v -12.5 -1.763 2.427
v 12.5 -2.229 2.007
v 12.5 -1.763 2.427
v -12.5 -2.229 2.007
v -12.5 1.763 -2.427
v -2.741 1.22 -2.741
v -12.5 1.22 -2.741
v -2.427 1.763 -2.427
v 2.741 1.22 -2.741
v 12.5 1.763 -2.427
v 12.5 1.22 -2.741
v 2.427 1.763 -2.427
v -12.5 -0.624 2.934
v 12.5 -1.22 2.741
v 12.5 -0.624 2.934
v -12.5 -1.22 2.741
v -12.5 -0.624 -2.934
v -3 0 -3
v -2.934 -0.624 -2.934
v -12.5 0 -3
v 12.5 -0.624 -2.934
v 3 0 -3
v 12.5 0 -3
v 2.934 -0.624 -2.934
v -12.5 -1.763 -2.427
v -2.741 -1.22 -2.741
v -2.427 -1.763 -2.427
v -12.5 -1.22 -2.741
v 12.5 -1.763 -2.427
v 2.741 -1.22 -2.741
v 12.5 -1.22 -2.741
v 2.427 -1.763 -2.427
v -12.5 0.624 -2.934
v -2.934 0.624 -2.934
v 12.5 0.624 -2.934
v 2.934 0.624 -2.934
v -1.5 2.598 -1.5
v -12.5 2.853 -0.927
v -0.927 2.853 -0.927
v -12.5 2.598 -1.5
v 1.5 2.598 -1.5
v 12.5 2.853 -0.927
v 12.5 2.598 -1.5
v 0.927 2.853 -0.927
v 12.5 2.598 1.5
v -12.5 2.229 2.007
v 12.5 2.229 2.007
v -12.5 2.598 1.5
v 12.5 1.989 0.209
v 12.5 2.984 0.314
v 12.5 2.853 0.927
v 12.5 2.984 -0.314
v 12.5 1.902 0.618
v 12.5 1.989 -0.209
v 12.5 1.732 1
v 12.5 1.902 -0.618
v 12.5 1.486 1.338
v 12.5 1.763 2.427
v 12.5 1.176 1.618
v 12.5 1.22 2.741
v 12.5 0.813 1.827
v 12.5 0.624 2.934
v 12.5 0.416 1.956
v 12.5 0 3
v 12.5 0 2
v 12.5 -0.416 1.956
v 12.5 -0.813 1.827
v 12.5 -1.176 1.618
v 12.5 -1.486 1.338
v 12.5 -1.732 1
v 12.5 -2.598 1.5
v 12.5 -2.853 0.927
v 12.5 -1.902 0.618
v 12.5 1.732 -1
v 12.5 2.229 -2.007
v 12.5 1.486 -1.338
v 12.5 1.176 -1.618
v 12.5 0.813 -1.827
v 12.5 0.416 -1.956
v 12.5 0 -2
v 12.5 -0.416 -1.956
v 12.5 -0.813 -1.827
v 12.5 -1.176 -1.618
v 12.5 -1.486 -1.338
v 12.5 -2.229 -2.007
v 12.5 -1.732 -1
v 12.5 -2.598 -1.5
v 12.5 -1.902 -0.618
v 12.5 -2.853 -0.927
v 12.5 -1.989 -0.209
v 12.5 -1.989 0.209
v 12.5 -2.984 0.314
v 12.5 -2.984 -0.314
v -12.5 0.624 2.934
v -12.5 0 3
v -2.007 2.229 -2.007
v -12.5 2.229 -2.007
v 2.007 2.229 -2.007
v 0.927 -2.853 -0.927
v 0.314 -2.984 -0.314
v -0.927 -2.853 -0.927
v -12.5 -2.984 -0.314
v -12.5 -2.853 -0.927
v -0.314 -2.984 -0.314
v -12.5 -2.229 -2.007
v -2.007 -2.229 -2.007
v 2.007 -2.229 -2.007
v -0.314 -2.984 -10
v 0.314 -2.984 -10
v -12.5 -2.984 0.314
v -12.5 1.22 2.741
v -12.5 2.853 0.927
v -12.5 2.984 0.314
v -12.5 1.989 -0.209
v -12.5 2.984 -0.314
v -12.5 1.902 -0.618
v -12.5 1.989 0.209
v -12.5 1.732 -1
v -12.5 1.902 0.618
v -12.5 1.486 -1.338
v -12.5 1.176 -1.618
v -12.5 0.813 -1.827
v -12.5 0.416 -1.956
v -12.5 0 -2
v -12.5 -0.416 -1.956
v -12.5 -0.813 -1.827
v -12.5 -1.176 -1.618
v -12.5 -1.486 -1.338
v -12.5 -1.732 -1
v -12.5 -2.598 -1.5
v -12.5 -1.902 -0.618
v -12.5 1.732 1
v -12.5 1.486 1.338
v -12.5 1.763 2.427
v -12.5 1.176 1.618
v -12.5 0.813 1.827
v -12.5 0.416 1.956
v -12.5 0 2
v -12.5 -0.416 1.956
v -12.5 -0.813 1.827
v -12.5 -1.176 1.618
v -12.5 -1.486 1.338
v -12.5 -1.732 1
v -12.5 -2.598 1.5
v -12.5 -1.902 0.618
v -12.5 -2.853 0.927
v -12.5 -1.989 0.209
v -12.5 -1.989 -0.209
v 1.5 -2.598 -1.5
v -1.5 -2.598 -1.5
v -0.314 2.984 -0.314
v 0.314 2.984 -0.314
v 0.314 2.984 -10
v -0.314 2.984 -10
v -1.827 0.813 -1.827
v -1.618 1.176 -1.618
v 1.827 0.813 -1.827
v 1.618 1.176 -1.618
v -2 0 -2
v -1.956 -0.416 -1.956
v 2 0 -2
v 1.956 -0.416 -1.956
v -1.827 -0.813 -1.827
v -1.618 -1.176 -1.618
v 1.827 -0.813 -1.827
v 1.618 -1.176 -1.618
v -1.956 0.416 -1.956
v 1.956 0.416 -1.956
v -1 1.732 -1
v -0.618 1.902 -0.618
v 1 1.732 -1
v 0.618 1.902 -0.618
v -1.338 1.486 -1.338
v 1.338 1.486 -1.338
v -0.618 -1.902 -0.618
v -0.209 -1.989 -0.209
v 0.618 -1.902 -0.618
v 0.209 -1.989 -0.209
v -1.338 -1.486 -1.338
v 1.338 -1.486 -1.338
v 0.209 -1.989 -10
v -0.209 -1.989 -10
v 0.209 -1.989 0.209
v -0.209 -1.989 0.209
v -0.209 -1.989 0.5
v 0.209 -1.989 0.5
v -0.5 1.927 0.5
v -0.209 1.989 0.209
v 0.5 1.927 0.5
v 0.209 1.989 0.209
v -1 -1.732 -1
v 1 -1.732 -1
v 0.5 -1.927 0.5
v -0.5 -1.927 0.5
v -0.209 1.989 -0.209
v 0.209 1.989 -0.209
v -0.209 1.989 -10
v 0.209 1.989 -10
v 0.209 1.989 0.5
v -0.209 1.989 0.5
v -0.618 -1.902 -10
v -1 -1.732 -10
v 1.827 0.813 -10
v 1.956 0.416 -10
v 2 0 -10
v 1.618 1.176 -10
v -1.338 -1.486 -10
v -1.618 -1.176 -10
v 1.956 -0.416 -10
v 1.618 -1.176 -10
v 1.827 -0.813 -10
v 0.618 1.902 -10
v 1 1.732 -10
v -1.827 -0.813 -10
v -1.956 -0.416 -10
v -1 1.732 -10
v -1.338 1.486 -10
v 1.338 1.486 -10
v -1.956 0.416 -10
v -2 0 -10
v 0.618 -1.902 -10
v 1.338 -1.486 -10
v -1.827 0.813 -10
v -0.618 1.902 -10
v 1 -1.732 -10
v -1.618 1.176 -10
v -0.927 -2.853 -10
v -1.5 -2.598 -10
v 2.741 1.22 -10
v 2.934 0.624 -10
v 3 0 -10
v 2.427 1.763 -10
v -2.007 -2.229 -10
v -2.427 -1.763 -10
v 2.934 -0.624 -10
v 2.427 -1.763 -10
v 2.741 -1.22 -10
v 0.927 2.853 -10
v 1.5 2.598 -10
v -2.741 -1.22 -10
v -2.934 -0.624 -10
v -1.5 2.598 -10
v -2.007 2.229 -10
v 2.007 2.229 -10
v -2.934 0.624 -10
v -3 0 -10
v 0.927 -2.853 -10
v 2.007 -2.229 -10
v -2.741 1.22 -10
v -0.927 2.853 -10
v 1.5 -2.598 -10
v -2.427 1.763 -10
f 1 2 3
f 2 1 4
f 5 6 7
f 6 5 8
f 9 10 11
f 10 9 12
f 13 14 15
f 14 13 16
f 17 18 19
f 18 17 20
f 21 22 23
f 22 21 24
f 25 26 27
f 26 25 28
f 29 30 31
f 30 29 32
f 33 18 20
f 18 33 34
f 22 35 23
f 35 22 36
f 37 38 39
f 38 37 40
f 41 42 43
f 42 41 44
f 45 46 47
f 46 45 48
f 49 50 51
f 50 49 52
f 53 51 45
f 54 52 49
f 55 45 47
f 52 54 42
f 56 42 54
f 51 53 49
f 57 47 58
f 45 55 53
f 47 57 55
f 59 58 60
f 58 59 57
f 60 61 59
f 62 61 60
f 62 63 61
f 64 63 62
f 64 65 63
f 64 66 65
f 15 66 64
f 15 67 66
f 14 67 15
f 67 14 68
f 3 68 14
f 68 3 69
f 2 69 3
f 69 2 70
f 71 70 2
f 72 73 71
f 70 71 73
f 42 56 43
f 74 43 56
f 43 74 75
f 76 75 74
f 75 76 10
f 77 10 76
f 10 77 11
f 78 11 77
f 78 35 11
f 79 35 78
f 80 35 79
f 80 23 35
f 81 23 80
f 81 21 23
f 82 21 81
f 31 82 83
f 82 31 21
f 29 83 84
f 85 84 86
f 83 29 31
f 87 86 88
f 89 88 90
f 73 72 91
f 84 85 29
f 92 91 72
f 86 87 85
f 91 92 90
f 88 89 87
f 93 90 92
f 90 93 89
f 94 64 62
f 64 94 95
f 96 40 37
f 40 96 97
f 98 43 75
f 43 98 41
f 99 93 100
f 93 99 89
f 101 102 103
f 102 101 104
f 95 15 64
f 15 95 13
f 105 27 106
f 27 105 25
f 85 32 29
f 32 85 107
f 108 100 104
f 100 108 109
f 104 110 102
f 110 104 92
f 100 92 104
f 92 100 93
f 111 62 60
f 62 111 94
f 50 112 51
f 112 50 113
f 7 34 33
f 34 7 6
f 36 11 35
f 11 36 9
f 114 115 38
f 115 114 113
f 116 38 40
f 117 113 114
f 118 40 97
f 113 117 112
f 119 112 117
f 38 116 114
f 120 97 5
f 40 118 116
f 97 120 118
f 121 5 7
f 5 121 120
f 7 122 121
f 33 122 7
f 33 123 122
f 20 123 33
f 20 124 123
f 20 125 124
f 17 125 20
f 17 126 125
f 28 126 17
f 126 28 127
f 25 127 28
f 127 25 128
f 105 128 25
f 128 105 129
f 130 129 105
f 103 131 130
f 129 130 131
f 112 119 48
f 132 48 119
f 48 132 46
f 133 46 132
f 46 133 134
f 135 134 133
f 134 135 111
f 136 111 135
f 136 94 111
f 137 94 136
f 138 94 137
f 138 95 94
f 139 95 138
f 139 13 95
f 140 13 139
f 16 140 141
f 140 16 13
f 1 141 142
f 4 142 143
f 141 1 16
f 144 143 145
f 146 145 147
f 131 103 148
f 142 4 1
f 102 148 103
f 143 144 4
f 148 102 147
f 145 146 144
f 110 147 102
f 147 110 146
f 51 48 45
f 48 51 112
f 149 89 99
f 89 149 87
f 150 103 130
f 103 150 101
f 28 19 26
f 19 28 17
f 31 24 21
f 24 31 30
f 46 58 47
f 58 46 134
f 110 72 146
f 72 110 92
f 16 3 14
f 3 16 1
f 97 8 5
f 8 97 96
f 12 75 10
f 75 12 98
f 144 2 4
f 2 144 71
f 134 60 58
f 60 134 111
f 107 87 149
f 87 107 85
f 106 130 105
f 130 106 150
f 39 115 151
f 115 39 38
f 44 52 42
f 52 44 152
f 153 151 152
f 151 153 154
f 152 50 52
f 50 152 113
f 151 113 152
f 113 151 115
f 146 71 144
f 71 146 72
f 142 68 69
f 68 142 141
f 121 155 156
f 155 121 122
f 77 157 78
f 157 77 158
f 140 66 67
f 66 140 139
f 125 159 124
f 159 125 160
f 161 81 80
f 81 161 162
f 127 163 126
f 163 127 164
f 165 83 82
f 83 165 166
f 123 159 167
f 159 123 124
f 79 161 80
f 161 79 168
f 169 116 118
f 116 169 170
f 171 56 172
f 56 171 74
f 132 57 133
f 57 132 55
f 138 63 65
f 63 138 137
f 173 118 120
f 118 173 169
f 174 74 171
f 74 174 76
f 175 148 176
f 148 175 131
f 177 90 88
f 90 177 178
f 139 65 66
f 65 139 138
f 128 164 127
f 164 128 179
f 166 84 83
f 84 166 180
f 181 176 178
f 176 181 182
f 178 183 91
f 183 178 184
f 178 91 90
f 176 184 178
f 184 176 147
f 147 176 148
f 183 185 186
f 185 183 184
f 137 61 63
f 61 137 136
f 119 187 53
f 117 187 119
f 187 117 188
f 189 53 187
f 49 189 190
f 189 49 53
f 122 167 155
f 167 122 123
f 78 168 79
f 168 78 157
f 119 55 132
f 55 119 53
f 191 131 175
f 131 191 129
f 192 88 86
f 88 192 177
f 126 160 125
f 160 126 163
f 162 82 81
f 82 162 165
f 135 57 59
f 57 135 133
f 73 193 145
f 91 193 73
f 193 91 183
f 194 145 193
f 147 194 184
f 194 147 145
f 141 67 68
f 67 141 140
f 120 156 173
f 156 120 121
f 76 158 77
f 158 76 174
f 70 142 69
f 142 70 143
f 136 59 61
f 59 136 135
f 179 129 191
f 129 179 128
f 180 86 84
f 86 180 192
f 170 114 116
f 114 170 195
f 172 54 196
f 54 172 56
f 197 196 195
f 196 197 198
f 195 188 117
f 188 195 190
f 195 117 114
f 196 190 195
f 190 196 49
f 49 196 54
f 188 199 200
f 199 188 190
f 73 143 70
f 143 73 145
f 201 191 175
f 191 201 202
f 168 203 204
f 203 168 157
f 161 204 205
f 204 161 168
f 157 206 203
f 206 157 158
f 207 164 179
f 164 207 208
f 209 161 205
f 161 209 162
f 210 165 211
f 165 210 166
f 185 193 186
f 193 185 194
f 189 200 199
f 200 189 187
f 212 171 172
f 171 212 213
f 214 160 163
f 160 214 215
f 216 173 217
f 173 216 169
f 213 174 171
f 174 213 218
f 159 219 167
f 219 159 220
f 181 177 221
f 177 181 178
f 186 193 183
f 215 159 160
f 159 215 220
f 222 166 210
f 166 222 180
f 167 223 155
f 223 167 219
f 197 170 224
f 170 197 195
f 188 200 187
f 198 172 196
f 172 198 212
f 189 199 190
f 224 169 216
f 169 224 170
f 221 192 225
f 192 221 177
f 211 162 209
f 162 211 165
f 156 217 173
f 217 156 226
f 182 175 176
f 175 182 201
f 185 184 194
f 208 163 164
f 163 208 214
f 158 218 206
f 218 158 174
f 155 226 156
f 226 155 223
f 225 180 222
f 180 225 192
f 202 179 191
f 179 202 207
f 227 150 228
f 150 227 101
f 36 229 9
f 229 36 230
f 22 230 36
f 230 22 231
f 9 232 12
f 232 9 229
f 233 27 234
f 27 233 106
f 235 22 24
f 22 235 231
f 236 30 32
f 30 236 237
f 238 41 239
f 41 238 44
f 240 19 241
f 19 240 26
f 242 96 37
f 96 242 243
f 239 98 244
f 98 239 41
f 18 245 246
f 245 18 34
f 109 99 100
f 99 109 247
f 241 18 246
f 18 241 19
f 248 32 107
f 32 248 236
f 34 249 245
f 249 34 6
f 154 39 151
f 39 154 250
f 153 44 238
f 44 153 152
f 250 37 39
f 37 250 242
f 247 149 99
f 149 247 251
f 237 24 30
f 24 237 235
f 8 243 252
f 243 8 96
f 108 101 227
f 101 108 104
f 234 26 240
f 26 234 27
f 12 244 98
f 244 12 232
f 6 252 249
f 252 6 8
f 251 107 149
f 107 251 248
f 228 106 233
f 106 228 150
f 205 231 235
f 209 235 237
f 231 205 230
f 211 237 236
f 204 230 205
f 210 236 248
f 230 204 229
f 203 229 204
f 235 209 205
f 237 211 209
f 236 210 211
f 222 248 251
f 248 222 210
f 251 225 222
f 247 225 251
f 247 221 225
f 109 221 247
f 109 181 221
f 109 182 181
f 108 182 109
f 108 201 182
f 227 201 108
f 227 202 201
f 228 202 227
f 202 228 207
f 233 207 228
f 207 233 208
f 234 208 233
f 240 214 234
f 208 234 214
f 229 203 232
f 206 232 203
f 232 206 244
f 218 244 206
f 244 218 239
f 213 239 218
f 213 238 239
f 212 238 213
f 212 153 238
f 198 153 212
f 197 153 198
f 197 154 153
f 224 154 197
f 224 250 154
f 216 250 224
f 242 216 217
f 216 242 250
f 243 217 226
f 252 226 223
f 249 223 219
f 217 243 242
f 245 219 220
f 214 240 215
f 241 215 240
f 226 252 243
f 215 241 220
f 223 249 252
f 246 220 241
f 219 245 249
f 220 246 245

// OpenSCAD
union(){
  difference(){
    rotate(a = [0, 90, 0]){
      cylinder($fn = 30, center = true, h = 25, r = 3);
    }
    rotate(a = [0, 90, 0]){
      cylinder($fn = 30, center = true, h = 26, r = 2);
    }
    translate(v = [0, 0, -7.5]){
      cylinder($fn = 30, center = true, h = 16, r = 2);
    }
  }
  difference(){
    translate(v = [0, 0, -5]){
      cylinder($fn = 30, center = true, h = 10, r = 3);
    }
    translate(v = [0, 0, -5]){
      cylinder($fn = 30, center = true, h = 11, r = 2);
    }
    rotate(a = [0, 90, 0]){
      cylinder($fn = 30, center = true, h = 31, r = 2);
    }
  }
}
